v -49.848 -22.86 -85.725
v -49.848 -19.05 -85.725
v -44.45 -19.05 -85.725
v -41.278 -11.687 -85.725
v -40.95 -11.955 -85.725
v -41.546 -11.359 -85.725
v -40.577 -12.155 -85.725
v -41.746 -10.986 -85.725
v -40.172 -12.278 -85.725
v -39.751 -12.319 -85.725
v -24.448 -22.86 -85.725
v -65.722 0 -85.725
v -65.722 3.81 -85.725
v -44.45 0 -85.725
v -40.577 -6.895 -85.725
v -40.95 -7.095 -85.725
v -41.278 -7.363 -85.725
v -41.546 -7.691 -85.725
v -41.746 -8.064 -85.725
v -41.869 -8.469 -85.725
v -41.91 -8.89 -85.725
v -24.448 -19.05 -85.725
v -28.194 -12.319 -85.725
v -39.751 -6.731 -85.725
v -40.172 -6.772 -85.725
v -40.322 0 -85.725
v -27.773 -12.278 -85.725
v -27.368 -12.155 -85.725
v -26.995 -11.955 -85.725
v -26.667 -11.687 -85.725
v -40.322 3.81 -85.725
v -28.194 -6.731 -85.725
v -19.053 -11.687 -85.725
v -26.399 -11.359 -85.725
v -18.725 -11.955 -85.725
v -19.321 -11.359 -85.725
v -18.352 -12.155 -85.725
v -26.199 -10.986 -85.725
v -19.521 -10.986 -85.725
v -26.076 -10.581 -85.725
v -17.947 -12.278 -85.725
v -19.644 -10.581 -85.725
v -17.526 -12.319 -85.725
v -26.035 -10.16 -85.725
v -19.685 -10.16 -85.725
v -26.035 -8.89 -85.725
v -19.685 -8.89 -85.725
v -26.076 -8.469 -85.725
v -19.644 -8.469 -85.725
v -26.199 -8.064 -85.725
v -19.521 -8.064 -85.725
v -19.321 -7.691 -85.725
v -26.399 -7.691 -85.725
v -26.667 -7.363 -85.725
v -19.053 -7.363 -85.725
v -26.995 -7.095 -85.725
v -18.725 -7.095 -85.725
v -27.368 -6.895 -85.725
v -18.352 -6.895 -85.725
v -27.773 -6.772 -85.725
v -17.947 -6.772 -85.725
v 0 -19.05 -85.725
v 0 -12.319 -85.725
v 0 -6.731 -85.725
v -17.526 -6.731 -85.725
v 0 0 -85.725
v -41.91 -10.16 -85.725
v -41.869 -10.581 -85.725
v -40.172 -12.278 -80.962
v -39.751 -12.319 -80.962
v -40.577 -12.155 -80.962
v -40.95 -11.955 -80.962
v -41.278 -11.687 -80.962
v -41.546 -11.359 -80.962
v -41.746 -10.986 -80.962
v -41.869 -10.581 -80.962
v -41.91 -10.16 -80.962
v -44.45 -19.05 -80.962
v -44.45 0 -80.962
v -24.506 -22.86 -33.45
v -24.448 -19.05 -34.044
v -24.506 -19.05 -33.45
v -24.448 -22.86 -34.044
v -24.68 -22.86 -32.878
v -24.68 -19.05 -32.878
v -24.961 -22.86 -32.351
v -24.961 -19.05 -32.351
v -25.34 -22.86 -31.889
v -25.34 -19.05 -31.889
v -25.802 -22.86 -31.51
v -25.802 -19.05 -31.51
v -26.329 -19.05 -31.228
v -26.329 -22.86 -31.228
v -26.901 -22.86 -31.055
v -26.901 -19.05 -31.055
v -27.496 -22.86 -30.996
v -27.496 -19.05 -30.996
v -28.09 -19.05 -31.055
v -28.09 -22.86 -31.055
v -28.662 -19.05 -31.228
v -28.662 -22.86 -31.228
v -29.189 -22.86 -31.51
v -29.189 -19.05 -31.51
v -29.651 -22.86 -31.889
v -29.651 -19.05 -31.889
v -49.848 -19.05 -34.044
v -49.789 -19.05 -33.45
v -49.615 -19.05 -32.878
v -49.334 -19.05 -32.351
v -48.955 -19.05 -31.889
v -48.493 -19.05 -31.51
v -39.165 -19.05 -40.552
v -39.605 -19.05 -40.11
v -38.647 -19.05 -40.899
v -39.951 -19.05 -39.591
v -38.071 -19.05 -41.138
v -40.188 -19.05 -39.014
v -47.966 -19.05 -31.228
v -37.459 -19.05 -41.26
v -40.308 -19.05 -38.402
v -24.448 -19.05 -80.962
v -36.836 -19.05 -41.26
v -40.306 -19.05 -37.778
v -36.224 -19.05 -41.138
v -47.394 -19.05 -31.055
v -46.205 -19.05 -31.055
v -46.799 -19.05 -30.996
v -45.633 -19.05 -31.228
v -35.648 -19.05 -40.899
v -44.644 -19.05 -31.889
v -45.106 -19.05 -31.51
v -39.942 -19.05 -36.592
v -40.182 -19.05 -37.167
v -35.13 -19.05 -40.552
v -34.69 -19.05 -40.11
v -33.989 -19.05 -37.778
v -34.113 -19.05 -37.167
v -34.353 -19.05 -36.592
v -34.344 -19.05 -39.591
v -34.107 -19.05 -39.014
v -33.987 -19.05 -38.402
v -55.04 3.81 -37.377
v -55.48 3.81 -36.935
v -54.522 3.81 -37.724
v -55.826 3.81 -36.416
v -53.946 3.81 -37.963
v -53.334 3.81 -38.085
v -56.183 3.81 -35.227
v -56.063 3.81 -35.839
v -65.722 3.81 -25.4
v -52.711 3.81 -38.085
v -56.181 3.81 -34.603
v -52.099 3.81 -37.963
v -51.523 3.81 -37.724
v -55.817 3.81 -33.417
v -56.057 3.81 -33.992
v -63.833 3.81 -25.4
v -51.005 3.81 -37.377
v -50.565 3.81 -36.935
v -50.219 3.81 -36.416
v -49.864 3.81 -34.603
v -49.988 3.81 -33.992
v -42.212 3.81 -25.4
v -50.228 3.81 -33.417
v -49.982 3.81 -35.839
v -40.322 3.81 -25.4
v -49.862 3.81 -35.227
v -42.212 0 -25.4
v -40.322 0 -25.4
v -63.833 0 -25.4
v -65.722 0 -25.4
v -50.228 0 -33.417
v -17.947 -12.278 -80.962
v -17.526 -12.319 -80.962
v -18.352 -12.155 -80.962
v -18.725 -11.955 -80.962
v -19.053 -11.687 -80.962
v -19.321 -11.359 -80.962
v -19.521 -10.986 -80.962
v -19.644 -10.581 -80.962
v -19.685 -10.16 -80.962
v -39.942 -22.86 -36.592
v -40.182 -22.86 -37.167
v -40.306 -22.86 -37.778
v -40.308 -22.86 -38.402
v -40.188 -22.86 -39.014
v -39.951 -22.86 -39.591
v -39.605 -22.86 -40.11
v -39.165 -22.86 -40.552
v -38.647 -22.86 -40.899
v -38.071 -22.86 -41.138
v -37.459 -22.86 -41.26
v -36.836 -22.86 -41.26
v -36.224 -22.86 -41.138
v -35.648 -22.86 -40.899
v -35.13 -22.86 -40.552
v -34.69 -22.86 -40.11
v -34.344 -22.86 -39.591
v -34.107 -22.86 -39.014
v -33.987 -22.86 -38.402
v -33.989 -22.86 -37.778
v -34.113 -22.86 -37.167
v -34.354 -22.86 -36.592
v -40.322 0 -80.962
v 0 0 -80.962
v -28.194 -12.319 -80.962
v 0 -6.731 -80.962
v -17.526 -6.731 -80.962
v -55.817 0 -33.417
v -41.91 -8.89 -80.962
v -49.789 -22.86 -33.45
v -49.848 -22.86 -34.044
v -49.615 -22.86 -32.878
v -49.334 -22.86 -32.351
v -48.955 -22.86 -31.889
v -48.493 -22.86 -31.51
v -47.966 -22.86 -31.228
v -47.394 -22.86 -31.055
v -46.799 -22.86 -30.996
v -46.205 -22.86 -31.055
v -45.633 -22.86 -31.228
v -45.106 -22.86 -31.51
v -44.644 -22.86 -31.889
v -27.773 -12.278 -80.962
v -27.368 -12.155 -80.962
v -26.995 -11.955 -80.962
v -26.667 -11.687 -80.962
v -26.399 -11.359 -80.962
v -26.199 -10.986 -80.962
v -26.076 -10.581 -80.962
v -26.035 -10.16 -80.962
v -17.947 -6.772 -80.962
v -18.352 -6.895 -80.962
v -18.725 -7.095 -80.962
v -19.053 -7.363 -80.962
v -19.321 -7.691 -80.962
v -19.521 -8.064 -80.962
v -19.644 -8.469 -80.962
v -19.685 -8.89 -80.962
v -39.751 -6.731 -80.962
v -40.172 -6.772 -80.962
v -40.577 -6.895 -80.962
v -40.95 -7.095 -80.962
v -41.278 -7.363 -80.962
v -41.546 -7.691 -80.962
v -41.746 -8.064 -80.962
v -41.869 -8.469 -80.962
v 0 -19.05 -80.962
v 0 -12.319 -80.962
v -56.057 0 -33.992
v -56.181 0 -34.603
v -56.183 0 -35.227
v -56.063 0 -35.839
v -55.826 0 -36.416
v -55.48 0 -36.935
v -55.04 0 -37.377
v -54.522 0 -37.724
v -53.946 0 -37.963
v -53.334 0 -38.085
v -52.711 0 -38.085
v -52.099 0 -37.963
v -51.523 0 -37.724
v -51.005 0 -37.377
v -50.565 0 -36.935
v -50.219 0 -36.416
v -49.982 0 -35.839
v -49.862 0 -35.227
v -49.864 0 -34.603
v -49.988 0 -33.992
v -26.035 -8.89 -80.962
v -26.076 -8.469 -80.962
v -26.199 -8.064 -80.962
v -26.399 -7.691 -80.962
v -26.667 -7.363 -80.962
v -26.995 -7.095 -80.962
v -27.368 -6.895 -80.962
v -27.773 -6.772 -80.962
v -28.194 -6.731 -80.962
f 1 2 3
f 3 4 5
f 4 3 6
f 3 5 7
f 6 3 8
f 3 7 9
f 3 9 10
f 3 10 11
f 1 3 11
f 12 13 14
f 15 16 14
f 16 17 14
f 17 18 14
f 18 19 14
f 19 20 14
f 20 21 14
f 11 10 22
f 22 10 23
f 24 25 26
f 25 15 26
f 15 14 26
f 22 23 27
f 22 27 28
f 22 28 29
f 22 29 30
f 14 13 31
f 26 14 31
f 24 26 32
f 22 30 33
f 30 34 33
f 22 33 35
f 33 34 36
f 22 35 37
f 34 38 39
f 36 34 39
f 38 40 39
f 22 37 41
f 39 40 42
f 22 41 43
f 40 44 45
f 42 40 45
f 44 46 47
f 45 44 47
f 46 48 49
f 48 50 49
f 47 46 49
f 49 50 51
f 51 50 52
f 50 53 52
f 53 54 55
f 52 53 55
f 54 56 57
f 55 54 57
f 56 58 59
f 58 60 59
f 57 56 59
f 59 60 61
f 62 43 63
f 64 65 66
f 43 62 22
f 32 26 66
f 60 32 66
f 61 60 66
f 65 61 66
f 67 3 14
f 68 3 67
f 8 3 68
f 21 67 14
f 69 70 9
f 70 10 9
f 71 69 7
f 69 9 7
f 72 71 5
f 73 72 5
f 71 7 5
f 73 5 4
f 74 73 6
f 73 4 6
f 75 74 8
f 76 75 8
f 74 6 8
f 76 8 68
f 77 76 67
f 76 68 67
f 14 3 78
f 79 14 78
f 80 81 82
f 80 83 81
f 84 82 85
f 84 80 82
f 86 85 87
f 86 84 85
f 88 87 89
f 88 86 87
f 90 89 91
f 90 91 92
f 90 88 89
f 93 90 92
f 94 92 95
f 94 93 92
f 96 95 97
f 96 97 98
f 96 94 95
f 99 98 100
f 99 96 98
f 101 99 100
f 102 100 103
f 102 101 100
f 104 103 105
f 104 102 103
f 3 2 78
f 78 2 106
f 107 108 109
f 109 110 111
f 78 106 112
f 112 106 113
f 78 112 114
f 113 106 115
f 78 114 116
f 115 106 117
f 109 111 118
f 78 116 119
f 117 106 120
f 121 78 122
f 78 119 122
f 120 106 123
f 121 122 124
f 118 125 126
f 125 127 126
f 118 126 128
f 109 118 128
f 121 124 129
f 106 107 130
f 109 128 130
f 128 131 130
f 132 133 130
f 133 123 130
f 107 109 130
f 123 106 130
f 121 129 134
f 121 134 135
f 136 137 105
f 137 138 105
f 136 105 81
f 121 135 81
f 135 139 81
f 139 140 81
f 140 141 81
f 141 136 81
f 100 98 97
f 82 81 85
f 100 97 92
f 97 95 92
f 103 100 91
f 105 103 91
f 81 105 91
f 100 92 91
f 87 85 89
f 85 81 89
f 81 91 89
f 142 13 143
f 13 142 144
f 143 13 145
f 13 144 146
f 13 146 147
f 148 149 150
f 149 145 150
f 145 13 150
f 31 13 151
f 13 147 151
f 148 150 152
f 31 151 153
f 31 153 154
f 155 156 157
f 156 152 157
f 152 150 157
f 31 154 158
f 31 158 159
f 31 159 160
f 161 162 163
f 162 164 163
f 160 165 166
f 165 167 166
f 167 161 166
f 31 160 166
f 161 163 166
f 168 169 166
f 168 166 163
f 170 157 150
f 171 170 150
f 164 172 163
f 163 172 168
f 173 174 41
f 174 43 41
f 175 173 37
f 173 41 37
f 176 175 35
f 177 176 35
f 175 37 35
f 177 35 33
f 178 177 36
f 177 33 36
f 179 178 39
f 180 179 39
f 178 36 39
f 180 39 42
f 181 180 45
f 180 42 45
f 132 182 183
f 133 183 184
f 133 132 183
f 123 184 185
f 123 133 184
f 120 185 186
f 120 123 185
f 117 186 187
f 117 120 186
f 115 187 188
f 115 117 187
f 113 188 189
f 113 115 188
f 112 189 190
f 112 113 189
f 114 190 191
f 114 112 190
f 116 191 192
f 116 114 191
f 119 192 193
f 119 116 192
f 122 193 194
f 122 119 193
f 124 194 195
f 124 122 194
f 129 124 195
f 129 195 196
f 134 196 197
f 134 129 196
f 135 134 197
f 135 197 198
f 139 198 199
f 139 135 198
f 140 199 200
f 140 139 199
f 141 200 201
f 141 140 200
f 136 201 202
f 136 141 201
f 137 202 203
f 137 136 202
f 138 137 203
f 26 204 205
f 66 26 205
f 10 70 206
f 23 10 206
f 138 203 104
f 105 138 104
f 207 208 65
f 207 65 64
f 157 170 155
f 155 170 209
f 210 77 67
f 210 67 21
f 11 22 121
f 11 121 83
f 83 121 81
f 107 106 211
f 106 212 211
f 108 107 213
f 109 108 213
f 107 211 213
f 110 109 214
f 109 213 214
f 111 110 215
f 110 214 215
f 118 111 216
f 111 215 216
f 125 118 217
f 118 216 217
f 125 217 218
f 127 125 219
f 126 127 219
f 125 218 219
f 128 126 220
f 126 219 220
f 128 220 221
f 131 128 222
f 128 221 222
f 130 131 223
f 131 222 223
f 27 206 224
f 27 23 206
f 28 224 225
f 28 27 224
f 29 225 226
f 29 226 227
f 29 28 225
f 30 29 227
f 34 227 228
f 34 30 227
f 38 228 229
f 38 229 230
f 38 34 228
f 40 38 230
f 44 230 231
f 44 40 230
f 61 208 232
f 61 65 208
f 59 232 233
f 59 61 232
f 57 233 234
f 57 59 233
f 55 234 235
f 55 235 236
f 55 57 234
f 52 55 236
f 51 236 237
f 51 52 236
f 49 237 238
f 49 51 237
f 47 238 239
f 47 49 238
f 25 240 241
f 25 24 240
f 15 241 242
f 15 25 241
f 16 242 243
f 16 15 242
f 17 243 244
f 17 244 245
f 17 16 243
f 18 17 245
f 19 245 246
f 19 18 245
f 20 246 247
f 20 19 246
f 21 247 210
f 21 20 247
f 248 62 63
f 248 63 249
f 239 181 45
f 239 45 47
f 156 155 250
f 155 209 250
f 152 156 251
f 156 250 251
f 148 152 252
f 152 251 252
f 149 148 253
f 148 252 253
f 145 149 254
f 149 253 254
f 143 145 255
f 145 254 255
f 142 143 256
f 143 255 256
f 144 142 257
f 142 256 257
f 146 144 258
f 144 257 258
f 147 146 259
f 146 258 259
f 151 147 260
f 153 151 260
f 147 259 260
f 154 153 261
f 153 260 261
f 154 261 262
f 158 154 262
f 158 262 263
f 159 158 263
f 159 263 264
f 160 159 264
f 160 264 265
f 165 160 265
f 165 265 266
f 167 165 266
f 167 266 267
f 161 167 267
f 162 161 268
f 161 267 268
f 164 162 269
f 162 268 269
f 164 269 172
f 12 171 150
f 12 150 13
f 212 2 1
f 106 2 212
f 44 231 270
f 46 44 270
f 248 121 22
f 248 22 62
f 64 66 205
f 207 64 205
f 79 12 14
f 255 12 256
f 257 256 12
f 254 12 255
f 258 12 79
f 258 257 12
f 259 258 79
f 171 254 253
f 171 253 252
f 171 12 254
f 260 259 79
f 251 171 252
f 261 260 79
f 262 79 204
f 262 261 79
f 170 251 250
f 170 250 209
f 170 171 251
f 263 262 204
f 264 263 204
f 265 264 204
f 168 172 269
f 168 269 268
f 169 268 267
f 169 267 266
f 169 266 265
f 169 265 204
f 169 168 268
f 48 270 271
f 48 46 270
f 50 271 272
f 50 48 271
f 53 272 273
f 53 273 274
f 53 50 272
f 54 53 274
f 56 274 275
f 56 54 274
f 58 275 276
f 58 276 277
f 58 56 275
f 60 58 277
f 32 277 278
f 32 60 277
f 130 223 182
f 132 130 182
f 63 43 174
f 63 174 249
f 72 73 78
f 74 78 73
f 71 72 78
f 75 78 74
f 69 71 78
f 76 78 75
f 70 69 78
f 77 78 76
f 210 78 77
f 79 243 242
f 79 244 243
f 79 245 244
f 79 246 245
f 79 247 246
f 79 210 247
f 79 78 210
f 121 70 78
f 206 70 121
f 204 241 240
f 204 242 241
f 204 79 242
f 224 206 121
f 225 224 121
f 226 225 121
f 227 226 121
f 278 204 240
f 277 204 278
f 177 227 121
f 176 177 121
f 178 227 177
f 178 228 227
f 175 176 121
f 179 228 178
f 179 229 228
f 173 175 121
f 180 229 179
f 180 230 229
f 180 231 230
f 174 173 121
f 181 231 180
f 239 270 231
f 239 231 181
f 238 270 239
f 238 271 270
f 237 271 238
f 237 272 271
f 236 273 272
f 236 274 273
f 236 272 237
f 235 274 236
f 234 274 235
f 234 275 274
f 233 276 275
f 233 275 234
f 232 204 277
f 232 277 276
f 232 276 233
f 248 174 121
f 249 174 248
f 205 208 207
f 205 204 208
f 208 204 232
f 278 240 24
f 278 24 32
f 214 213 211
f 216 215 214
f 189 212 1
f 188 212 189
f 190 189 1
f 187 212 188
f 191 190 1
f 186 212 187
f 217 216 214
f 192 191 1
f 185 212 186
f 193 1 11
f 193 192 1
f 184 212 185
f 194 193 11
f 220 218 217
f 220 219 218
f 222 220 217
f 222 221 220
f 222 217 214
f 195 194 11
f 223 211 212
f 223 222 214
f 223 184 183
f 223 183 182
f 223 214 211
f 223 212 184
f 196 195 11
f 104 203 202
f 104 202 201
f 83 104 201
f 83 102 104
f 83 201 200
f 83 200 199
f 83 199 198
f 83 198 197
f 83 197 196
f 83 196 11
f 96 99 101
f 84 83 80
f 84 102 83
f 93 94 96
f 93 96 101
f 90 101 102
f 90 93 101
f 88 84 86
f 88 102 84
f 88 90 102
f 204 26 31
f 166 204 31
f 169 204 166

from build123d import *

# Parameters (mm, degrees)
F0_W           = 44.45
F0_H           = 4.7625
F1_DEPTH       = 19.05
F2_W           = 15.875
F2_H           = 5.588
F3_DEPTH       = 4.7635
F4_R           = 2.159
F5_R           = 3.175
F6_DEPTH       = 3.81
F7_W           = 34.26374
F7_H           = 5.588
F8_DEPTH       = 25.4
F10_DEPTH      = 3.811
F10_DEPTH_BACK = 19.051
F11_W          = 25.4
F11_H          = 61.851404
F11_R          = 3.175
F12_DEPTH      = 3.81
F14_DEPTH      = 5.08
F15_R          = 3.048


with BuildPart() as f1:
    # F0 (on Front) → F1 (new body)
    with BuildSketch(Plane.XZ):
        with Locations((-22.225, -83.34375)):
            Rectangle(F0_W, F0_H)
    extrude(amount=F1_DEPTH)

    # F2 (on face) → F3 (cut, through all)
    with BuildSketch(Plane.XY.offset(-80.9625)):
        with Locations((-33.9725, -9.525)):
            Rectangle(F2_W, F2_H)
        with Locations((-11.7475, -9.525)):
            Rectangle(F2_W, F2_H)
    extrude(amount=-F3_DEPTH, mode=Mode.SUBTRACT)

    # F4
    f4_edges = [f1.edges().sort_by_distance(p)[0] for p in [
        (-3.81, -6.731, -83.34375),
        (-26.035, -6.731, -83.34375),
        (-3.81, -12.319, -83.34375),
        (-26.035, -12.319, -83.34375),
        (-19.685, -6.731, -83.34375),
        (-41.91, -6.731, -83.34375),
        (-19.685, -12.319, -83.34375),
        (-41.91, -12.319, -83.34375),
    ]]
    fillet(f4_edges, radius=F4_R)

    # F5 (on Front) → F6 (join)
    with BuildSketch(Plane.XZ):
        Polygon((-65.7225, -85.725), (-44.45, -85.725), (-40.3225, -85.725), (-40.3225, -25.4), (-65.7225, -25.4), align=None)
        with Locations((-53.0225, -34.925)):
            Circle(F5_R, mode=Mode.SUBTRACT)
    extrude(amount=-F6_DEPTH)

    # F7 (on face) → F8 (cut)
    with BuildSketch(Plane(origin=(0, 0, -85.725), x_dir=(1, 0, 0), z_dir=(0, 0, -1))):
        with Locations((6.945667, 9.525)):
            Rectangle(F7_W, F7_H)
    extrude(amount=-F8_DEPTH, mode=Mode.SUBTRACT)

    # F9 (on Front) → F10 (cut, two sides)
    with BuildSketch(Plane.XZ) as f10_sk:
        Polygon((-68.922343, -20.311116), (-53.0225, -36.210959), (-37.122657, -20.311116), align=None)
    extrude(amount=-F10_DEPTH, mode=Mode.SUBTRACT)
    extrude(f10_sk.sketch, amount=-F10_DEPTH_BACK, mode=Mode.SUBTRACT)

    # F11 (on face) → F12 (join)
    with BuildSketch(Plane.XZ.offset(19.05)):
        with Locations((-37.1475, -54.799298)):
            Rectangle(F11_W, F11_H)
        with Locations((-37.1475, -38.1)):
            Circle(F11_R, mode=Mode.SUBTRACT)
    extrude(amount=F12_DEPTH)

    # F13 (on face) → F14 (cut)
    with BuildSketch(Plane.XZ.offset(22.86)):
        Polygon((-55.090682, -21.442777), (-39.9415, -36.591959), (-34.3535, -36.591959), (-19.204318, -21.442777), align=None)
    extrude(amount=-F14_DEPTH, mode=Mode.SUBTRACT)

    # F15
    f15_edges = [f1.edges().sort_by_distance(p)[0] for p in [
        (-49.8475, -20.955, -26.685959),
        (-24.4475, -20.955, -26.685959),
    ]]
    fillet(f15_edges, radius=F15_R)


solid = f1.part
